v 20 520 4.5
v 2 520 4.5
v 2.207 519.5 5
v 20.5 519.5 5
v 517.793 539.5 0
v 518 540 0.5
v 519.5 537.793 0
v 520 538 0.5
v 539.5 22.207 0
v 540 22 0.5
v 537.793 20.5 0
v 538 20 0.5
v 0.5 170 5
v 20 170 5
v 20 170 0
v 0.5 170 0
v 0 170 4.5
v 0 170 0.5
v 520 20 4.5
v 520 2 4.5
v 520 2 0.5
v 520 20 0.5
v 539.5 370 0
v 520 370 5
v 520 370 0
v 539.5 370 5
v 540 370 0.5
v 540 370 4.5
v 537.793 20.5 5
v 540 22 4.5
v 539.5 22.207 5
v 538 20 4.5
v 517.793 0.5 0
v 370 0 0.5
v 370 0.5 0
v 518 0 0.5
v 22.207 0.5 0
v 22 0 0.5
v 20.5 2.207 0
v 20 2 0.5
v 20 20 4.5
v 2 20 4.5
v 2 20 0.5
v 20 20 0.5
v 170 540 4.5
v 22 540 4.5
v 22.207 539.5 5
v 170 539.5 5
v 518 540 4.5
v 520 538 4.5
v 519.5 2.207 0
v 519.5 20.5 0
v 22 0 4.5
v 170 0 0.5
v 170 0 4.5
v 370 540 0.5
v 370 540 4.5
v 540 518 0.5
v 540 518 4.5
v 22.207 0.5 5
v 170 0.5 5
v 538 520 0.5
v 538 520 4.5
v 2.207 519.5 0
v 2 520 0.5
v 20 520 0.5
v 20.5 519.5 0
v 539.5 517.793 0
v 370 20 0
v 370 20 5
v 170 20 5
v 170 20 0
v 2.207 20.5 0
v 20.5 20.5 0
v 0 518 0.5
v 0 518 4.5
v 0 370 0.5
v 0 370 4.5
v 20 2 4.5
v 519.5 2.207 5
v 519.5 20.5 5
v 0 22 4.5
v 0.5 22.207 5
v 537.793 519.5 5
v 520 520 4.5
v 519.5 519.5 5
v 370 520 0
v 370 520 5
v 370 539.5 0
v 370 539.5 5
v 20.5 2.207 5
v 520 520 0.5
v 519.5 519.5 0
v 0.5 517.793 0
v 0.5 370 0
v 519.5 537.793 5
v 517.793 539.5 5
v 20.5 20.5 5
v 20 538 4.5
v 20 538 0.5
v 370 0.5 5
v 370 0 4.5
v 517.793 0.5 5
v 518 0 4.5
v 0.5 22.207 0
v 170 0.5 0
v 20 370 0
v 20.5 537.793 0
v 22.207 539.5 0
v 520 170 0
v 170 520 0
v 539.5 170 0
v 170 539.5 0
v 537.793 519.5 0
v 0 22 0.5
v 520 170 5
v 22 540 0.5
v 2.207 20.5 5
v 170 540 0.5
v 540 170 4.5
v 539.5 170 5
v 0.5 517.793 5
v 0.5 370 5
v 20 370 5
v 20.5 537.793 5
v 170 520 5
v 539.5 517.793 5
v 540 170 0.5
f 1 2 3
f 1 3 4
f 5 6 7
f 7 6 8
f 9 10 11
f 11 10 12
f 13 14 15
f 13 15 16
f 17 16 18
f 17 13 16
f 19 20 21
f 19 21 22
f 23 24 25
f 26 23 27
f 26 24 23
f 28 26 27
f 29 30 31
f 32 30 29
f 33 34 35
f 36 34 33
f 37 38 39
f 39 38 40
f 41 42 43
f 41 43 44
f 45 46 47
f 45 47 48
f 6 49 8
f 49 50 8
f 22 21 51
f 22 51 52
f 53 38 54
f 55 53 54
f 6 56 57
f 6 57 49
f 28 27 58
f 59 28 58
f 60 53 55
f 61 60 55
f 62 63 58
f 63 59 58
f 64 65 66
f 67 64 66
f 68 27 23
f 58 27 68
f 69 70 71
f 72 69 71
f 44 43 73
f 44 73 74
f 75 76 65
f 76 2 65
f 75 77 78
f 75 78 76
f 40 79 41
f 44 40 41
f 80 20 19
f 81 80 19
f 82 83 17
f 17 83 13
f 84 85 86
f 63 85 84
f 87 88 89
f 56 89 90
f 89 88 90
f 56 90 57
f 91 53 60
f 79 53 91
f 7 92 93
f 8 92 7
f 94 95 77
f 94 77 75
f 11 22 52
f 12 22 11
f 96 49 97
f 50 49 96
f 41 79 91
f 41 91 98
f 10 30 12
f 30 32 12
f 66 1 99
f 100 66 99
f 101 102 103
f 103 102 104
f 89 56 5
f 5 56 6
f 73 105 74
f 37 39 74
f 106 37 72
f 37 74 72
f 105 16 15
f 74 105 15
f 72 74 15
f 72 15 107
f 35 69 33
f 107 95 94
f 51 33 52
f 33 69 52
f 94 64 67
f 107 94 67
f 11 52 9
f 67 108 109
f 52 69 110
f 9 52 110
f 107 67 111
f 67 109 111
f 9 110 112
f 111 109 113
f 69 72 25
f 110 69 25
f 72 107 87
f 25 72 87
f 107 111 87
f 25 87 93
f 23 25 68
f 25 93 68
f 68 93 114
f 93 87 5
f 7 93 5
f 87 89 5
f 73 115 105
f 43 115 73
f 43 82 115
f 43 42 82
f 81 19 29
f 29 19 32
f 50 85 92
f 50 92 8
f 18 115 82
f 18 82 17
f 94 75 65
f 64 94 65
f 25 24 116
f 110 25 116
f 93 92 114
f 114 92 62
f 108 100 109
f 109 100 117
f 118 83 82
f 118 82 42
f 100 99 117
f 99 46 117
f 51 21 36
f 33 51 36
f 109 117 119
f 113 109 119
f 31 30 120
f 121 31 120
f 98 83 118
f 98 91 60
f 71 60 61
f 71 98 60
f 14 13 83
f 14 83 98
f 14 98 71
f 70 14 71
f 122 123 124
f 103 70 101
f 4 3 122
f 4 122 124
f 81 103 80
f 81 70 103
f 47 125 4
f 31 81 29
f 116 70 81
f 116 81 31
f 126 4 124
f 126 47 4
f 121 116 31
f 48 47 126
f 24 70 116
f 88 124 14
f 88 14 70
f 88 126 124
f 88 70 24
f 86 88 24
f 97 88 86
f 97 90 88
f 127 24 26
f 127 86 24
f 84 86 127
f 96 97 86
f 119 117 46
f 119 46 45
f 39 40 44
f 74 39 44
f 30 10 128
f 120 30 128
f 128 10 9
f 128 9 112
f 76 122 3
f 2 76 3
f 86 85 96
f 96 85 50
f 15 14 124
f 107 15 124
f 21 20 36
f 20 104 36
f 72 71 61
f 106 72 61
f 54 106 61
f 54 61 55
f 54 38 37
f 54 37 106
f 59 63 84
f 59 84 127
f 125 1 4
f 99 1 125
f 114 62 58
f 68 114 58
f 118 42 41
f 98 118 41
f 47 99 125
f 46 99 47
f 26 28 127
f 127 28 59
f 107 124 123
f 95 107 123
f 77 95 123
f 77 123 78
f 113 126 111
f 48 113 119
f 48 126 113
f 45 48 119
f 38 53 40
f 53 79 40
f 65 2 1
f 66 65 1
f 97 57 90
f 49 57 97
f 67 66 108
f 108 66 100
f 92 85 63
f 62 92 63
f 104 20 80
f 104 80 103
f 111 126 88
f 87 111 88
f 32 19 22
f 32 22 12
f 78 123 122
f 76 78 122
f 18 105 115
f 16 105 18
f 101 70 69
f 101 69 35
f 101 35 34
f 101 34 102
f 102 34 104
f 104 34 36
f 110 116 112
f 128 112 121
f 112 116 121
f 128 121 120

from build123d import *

# Parameters (mm, degrees)
SKETCH1_W           = 540
SKETCH1_H           = 540
BOSS_EXTRUDE1_DEPTH = 5
SKETCH2_W           = 20
SKETCH2_H           = 20
CUT_EXTRUDE1_DEPTH  = 5
CHAMFER1_SIZE       = 2
CHAMFER2_SIZE       = 0.5
SKETCH3_W           = 200
SKETCH3_H           = 77.416612185
CUT_EXTRUDE2_DEPTH  = 10
CIRPATTERN1_COUNT   = 4


with BuildPart() as part:
    # Sketch1 → Boss-Extrude1 (new body)
    with BuildSketch(Plane.XY):
        with Locations((270, 270)):
            Rectangle(SKETCH1_W, SKETCH1_H)
    extrude(amount=BOSS_EXTRUDE1_DEPTH)

    # Sketch2 → Cut-Extrude1 (cut)
    with BuildSketch(Plane.XY.offset(5)):
        with Locations((10, 530)):
            Rectangle(SKETCH2_W, SKETCH2_H)
        with Locations((530, 530)):
            Rectangle(SKETCH2_W, SKETCH2_H)
        with Locations((530, 10)):
            Rectangle(SKETCH2_W, SKETCH2_H)
        with Locations((10, 10)):
            Rectangle(SKETCH2_W, SKETCH2_H)
    extrude(amount=-CUT_EXTRUDE1_DEPTH, mode=Mode.SUBTRACT)

    # Chamfer1
    chamfer1_edges = [part.edges().sort_by_distance(p)[0] for p in [
        (0, 520, 2.5),
        (20, 540, 2.5),
        (520, 540, 2.5),
        (540, 520, 2.5),
        (20, 0, 2.5),
        (0, 20, 2.5),
        (540, 20, 2.5),
        (520, 0, 2.5),
    ]]
    chamfer(chamfer1_edges, length=CHAMFER1_SIZE)

    # Chamfer2
    chamfer2_edges = [part.edges().sort_by_distance(p)[0] for p in [
        (1, 21, 0),
        (11, 20, 0),
        (20, 11, 0),
        (21, 1, 0),
        (270, 0, 0),
        (519, 1, 0),
        (520, 11, 0),
        (529, 20, 0),
        (539, 21, 0),
        (540, 270, 0),
        (539, 519, 0),
        (529, 520, 0),
        (520, 529, 0),
        (519, 539, 0),
        (270, 540, 0),
        (21, 539, 0),
        (20, 529, 0),
        (11, 520, 0),
        (1, 519, 0),
        (0, 270, 0),
        (20, 529, 5),
        (21, 539, 5),
        (270, 540, 5),
        (519, 539, 5),
        (520, 529, 5),
        (529, 520, 5),
        (539, 519, 5),
        (540, 270, 5),
        (539, 21, 5),
        (529, 20, 5),
        (520, 11, 5),
        (519, 1, 5),
        (270, 0, 5),
        (21, 1, 5),
        (20, 11, 5),
        (11, 20, 5),
        (1, 21, 5),
        (0, 270, 5),
        (1, 519, 5),
        (11, 520, 5),
    ]]
    chamfer(chamfer2_edges, length=CHAMFER2_SIZE)

    # Sketch3 → Cut-Extrude2 (cut)
    with BuildSketch(Plane.XY.offset(5)):
        with Locations((270, 558.708306093)):
            Rectangle(SKETCH3_W, SKETCH3_H)
    cut_extrude2 = extrude(amount=-CUT_EXTRUDE2_DEPTH, mode=Mode.SUBTRACT)

    # CirPattern1: Cut-Extrude2 ×4 about axis
    cirpattern1_axis = Axis((270, 270, 5), (0, 0, 1))
    for i in range(1, CIRPATTERN1_COUNT):
        add(cut_extrude2.rotate(cirpattern1_axis, i * 360 / CIRPATTERN1_COUNT), mode=Mode.SUBTRACT)


solid = part.part
